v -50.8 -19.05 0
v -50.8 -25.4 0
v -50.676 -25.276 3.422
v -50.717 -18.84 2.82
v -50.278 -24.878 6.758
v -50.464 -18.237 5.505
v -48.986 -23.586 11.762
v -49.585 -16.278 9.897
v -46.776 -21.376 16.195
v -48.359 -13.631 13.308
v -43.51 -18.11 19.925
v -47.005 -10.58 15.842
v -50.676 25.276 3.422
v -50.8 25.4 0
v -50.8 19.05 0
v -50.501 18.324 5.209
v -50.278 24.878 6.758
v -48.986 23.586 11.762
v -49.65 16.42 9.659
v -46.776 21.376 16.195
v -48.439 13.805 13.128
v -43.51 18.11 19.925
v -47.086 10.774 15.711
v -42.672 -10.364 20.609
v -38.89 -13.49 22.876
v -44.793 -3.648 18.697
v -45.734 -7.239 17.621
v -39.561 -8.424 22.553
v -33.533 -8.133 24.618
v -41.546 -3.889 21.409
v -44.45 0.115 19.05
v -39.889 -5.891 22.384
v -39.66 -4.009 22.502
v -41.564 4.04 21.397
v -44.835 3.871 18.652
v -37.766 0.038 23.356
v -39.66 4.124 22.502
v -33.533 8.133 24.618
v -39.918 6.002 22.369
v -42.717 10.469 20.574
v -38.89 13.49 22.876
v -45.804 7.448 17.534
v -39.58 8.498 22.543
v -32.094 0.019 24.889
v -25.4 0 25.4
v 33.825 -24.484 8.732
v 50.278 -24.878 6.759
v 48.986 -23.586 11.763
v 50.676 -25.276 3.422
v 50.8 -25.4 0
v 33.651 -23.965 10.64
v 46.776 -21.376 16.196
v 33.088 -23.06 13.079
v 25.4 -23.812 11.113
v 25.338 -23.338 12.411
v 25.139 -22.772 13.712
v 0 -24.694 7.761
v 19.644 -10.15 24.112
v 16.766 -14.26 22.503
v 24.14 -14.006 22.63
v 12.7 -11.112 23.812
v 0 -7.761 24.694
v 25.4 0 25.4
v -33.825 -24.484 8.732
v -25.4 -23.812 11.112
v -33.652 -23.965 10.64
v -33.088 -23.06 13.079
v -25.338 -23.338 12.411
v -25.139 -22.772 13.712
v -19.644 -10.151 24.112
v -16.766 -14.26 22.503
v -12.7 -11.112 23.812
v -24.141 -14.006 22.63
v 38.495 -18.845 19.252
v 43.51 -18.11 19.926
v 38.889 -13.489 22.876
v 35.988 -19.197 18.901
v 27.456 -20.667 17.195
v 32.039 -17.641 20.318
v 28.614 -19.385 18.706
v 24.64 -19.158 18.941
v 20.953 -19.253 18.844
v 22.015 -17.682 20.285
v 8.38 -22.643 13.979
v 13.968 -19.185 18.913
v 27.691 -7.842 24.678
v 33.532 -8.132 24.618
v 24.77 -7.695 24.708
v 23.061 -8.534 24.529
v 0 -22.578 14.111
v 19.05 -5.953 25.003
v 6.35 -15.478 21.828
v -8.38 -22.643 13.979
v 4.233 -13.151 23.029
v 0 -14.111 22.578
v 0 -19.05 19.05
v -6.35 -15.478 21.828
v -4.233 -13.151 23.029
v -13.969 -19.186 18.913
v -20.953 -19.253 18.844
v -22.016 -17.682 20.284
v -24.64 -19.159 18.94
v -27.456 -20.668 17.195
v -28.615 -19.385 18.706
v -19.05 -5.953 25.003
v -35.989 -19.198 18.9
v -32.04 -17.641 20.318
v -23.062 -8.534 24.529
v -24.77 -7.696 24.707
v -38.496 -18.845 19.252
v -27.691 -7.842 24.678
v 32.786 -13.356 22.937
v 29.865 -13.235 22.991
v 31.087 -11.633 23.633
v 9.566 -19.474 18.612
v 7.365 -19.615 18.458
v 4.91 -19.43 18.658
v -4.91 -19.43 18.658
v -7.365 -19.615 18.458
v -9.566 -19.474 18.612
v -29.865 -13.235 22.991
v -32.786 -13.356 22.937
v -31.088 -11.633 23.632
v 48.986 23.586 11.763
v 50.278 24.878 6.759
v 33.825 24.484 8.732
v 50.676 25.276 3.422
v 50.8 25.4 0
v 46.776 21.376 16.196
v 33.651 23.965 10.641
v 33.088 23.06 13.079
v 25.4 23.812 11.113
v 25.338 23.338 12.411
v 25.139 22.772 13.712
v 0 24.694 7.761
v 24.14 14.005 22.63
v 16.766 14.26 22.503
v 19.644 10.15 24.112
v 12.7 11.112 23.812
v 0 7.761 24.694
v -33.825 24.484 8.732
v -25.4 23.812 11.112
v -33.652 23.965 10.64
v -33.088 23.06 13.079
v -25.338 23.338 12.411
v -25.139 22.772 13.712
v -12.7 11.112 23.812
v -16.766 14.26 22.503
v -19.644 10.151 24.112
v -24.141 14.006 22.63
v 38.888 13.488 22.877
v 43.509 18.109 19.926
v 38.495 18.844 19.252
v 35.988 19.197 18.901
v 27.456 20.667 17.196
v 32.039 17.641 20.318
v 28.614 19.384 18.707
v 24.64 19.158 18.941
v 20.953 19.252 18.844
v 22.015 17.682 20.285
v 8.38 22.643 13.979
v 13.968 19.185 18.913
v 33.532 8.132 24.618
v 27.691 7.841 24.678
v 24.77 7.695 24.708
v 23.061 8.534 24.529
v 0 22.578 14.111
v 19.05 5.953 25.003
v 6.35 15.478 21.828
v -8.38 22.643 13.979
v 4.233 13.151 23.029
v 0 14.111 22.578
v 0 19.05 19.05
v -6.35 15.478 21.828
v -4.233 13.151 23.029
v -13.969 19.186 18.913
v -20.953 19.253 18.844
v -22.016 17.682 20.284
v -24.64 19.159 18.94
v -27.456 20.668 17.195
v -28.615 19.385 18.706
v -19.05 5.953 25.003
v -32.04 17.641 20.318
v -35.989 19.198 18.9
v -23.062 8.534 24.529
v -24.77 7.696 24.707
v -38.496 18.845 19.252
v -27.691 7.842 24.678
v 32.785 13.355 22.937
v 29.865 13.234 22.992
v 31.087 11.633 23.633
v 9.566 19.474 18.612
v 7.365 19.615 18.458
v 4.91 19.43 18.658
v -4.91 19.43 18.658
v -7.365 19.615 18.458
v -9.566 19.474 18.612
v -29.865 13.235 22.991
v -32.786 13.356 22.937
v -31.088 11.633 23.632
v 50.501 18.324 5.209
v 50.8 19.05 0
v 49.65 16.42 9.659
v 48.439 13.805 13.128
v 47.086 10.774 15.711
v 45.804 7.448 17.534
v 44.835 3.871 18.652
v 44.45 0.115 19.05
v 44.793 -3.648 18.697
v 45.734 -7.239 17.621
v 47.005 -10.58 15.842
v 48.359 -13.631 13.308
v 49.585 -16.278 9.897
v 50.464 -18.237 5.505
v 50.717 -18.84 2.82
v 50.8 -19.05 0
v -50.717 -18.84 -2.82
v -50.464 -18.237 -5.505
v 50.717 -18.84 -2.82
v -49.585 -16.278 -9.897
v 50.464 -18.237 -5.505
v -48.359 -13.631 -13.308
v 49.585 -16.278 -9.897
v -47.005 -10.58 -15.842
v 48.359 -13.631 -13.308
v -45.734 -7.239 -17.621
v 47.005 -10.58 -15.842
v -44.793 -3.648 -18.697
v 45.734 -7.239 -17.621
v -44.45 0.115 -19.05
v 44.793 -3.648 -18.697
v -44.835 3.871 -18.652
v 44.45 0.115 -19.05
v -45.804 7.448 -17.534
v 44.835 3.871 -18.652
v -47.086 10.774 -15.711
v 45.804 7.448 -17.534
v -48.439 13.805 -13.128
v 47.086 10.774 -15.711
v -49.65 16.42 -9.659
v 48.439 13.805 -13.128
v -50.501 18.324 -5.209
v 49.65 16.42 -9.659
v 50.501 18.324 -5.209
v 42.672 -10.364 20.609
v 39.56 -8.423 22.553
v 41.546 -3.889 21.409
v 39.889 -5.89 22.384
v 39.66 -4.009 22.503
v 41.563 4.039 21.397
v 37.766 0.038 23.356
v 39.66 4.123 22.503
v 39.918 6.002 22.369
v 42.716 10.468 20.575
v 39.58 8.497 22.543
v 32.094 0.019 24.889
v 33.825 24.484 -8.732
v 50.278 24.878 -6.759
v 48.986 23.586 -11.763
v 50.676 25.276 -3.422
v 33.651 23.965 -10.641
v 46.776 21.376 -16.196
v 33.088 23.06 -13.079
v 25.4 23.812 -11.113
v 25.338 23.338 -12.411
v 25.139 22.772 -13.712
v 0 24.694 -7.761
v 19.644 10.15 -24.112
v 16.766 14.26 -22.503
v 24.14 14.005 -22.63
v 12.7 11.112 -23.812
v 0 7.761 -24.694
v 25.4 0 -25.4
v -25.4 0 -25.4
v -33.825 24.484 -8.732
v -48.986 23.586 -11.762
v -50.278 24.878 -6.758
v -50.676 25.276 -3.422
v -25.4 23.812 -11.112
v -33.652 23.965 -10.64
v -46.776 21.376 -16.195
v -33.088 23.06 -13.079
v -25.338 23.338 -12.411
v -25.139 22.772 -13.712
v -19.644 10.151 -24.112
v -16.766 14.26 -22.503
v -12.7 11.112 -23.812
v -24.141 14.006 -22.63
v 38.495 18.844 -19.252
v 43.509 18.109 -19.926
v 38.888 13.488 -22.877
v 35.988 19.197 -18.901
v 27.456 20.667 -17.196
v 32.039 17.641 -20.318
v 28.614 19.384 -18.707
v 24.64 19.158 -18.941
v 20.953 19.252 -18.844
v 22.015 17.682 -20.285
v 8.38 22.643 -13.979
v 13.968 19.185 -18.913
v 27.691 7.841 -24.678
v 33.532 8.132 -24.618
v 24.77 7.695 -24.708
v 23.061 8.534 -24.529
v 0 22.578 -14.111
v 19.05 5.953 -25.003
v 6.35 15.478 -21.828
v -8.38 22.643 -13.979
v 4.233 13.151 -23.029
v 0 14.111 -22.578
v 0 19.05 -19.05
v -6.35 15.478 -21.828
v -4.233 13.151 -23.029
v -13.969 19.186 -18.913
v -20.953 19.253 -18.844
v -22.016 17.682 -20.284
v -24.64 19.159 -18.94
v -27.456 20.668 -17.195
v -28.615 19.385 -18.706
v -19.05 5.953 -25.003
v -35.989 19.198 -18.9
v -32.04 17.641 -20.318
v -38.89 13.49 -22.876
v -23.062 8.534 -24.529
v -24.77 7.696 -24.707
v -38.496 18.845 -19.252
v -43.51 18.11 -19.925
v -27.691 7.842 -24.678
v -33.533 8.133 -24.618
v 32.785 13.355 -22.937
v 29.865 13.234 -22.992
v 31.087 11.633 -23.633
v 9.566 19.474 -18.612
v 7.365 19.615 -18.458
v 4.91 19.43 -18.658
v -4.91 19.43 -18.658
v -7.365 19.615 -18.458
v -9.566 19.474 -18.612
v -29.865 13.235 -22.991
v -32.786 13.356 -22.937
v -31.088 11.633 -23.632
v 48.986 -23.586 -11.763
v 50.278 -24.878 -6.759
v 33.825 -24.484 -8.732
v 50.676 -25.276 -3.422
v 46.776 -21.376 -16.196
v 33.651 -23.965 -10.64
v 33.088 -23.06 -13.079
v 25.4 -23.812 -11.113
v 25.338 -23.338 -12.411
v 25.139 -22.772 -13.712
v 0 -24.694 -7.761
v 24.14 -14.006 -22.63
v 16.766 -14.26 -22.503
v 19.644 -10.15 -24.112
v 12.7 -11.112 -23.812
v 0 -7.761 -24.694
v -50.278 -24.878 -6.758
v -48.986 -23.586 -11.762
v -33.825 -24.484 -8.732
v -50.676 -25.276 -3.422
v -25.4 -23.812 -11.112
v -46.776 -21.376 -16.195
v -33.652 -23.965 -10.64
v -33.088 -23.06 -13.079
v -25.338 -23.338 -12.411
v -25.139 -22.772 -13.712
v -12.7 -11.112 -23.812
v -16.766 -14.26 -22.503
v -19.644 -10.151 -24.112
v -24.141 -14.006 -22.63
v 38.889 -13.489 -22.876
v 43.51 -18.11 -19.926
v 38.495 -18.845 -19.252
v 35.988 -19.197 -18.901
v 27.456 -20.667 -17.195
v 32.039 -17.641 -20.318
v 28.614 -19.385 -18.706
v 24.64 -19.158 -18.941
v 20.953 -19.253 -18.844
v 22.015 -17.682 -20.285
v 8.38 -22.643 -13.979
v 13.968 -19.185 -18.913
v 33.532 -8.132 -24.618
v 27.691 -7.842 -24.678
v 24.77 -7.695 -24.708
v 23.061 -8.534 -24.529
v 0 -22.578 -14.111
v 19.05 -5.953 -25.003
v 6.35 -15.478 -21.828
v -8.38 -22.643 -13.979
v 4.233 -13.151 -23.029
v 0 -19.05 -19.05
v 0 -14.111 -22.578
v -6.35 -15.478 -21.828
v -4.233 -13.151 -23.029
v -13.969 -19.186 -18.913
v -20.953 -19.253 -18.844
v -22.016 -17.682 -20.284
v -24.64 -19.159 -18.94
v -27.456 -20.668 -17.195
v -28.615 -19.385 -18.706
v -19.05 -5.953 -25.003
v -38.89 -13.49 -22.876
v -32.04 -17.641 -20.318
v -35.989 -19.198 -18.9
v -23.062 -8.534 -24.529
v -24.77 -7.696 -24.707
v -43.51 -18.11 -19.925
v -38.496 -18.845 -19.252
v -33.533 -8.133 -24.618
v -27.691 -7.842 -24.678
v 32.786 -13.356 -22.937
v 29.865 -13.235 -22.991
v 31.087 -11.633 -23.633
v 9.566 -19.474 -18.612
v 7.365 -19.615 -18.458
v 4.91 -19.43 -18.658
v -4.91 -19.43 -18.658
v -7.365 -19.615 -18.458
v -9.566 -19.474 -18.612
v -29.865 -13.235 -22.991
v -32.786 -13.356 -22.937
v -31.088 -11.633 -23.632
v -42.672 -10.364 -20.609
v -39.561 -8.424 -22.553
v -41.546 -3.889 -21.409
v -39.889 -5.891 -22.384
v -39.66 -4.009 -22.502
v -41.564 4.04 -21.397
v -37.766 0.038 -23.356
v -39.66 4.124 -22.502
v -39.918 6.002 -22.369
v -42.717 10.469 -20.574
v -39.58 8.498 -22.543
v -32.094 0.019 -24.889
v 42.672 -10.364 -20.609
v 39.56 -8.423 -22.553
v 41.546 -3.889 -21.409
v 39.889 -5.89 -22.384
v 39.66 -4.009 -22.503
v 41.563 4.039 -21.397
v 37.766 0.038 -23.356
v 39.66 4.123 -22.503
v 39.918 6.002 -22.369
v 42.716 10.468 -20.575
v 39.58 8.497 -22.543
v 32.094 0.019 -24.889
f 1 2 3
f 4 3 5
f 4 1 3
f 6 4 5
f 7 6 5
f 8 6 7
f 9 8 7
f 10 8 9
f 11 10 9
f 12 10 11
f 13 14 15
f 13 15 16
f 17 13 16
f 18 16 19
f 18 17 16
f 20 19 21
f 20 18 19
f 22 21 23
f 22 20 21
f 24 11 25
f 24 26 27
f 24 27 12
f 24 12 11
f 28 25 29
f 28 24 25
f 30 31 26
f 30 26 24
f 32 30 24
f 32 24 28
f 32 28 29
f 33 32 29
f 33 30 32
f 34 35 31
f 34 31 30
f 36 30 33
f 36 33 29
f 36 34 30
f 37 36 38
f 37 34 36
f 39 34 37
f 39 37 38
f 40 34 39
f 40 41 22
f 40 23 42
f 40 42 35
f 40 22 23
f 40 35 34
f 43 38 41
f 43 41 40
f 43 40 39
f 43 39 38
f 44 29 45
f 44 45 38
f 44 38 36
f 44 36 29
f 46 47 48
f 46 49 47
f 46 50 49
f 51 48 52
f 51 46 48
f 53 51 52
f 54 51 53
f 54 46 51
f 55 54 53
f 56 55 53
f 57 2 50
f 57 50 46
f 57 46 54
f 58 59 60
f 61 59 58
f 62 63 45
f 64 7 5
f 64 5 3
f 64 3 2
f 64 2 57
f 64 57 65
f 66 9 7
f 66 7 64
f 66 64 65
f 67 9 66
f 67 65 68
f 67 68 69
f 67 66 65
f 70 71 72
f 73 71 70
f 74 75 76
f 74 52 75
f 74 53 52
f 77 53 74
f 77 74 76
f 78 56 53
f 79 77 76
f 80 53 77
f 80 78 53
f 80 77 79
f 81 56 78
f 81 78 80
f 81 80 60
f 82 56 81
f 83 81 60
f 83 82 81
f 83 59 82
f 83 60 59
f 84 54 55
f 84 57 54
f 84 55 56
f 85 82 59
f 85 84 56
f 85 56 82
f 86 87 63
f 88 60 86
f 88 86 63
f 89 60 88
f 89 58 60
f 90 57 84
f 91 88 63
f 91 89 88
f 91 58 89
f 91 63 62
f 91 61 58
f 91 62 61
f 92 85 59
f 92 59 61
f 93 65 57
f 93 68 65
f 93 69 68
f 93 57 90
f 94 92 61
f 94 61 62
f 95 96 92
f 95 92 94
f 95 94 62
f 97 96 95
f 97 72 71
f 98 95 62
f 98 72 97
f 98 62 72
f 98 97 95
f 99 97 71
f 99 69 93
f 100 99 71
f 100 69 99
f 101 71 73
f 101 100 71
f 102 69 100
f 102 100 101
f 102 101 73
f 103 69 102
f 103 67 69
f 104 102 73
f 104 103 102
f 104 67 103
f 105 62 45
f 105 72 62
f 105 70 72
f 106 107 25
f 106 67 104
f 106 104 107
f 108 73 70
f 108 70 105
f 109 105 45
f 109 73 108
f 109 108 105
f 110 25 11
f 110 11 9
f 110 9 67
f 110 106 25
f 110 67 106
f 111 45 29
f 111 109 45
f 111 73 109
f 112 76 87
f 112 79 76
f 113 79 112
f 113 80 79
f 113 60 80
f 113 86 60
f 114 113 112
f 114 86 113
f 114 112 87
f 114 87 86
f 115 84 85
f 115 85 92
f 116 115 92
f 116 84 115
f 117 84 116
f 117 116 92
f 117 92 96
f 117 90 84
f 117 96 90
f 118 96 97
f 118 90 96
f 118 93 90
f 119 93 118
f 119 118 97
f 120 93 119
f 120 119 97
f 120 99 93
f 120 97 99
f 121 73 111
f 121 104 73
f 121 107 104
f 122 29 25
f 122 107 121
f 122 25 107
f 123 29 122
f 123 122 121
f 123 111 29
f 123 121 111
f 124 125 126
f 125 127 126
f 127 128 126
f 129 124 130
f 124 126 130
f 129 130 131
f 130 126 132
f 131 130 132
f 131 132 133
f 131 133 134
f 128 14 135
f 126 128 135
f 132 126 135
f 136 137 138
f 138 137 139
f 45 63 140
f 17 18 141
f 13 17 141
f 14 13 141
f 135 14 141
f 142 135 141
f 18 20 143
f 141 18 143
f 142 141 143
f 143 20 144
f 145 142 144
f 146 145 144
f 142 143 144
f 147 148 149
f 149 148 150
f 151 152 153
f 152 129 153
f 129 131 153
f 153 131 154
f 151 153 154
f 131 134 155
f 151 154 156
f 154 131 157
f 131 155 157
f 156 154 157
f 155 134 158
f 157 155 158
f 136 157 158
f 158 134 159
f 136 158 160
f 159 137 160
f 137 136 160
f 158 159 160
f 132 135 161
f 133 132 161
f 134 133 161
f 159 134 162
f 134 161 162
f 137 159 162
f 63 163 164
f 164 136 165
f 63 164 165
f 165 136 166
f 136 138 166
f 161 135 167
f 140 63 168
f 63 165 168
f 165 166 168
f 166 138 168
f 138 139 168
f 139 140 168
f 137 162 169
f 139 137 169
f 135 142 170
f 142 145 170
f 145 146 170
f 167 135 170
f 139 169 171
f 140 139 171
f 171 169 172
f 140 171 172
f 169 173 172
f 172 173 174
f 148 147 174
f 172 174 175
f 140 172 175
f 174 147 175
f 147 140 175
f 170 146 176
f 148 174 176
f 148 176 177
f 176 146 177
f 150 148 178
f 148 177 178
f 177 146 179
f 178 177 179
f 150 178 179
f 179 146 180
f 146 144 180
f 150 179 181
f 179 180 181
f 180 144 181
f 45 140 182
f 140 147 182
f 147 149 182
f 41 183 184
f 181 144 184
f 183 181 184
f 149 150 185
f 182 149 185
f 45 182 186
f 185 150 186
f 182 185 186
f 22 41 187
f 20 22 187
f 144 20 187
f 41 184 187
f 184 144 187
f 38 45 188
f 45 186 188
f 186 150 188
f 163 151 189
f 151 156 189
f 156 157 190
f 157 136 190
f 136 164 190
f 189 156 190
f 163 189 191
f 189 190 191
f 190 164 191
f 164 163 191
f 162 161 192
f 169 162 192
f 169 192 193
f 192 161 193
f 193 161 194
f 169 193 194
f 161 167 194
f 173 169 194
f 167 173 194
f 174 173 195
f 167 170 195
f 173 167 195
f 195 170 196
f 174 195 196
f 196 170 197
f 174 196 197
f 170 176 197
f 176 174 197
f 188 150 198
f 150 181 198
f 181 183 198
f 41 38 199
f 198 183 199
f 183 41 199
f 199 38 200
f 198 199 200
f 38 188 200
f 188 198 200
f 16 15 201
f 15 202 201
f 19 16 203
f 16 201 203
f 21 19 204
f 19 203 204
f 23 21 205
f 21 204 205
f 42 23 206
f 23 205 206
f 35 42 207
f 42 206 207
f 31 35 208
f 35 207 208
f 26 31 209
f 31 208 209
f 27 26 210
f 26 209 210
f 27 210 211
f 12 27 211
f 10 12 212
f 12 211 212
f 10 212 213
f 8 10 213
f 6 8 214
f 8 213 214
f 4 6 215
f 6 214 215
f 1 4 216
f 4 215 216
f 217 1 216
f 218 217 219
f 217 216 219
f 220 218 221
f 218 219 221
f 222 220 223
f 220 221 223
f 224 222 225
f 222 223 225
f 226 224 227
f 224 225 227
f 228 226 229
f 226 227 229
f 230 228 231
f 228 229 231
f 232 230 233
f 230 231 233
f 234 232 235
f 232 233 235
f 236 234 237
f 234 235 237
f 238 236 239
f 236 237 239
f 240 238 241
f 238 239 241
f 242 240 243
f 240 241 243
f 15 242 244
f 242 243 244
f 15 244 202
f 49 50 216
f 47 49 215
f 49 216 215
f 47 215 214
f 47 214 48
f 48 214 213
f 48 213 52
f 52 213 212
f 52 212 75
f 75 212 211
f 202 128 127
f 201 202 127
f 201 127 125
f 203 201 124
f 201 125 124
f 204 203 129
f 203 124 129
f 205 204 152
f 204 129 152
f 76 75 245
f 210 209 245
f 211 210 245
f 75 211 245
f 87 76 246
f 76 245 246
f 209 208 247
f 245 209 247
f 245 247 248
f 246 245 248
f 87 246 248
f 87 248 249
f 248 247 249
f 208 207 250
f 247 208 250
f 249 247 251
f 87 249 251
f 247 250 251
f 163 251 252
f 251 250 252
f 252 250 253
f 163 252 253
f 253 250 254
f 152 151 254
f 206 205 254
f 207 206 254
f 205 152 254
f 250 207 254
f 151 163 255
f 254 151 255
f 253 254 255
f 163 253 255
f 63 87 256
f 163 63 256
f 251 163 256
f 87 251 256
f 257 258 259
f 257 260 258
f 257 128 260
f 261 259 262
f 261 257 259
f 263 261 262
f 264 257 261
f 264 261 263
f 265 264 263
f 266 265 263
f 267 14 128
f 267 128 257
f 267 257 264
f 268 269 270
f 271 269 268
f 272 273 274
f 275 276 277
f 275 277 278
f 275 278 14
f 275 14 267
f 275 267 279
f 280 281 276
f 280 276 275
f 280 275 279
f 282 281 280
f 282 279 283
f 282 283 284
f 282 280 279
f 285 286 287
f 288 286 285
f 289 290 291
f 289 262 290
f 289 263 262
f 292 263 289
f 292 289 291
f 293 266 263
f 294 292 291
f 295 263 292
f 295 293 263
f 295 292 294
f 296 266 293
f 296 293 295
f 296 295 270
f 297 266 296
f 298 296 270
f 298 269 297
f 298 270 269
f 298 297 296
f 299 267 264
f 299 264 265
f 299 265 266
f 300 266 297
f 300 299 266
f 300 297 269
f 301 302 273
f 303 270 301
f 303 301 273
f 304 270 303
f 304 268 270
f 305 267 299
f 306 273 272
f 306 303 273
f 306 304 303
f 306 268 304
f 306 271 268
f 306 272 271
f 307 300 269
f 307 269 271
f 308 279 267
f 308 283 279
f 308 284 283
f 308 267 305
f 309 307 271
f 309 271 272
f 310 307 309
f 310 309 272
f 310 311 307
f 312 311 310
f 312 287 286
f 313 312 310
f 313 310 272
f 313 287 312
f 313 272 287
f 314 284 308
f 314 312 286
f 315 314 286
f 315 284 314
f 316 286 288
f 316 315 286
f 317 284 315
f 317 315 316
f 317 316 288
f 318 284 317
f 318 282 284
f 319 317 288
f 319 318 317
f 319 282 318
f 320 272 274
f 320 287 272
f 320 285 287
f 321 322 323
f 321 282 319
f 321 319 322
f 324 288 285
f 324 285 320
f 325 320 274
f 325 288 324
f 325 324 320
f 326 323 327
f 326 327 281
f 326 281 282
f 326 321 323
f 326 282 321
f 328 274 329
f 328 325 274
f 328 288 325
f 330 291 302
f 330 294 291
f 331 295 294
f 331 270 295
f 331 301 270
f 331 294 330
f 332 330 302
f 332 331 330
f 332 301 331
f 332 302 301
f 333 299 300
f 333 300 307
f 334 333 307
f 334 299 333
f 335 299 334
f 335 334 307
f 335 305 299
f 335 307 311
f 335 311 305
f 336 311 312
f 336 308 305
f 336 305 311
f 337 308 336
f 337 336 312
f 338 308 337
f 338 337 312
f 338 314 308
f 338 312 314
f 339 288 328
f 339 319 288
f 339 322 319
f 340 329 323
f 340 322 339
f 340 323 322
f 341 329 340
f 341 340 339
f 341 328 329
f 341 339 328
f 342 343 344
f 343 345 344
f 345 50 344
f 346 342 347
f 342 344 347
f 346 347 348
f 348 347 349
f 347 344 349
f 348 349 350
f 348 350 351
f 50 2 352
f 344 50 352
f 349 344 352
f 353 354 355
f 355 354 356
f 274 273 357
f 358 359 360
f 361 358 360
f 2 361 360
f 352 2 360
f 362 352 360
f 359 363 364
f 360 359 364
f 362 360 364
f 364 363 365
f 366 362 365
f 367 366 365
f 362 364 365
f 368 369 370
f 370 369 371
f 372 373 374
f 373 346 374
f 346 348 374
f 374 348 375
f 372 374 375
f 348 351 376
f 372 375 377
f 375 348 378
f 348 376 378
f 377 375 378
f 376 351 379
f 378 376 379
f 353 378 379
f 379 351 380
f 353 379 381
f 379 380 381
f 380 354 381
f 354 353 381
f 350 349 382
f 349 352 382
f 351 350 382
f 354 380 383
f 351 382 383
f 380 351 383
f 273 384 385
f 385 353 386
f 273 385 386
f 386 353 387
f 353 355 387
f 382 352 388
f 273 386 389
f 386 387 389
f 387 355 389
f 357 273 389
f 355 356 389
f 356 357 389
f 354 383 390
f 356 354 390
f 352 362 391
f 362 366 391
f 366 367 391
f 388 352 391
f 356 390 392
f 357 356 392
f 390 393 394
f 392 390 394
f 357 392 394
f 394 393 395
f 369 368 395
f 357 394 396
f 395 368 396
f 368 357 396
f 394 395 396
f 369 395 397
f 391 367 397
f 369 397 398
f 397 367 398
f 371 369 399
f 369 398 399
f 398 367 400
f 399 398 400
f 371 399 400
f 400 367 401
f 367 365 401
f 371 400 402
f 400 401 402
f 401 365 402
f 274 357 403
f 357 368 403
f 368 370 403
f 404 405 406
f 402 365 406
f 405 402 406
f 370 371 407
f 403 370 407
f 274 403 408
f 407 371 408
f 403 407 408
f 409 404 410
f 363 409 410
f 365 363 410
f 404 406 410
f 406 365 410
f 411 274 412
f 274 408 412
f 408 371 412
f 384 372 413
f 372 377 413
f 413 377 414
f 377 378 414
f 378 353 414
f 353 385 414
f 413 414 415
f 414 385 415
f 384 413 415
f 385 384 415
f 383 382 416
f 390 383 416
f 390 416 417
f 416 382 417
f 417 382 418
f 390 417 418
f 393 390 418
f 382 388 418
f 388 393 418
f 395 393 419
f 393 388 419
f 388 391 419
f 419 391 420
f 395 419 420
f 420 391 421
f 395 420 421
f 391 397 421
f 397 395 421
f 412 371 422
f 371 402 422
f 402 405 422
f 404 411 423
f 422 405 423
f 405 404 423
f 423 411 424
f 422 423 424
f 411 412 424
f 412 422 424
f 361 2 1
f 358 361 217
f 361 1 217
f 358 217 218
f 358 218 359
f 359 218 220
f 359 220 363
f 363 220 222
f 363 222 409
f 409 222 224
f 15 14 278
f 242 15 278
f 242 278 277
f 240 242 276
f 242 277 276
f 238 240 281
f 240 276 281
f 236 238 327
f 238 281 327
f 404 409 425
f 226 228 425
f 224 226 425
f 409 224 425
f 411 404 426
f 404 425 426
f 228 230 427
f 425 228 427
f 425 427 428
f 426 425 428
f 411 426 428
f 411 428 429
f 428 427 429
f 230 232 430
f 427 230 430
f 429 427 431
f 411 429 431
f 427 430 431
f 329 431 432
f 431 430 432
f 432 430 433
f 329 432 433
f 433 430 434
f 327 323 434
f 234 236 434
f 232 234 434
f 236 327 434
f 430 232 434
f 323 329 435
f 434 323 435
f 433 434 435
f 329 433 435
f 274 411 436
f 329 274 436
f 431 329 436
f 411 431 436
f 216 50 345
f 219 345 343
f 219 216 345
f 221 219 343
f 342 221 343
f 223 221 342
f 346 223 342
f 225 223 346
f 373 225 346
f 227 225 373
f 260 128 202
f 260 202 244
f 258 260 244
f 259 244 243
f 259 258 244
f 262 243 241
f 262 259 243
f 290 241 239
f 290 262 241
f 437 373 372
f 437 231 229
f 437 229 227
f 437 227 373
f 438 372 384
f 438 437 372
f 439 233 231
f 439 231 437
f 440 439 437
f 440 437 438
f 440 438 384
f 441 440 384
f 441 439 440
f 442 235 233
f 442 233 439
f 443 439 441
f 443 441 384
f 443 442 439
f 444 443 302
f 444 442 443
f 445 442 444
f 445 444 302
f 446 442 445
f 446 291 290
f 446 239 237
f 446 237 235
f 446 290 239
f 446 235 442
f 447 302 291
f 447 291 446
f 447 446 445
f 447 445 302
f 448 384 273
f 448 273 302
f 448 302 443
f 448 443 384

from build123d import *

# Parameters (mm, degrees)
F0_W          = 101.6
F0_H          = 50.8
F1_DEPTH      = 25.4
F2_T1_DEPTH   = 177.8
F2_T3_DEPTH   = 228.6
F4_R          = 19.05
F5_DEPTH      = 50.8
F5_DEPTH_BACK = 50.8


# Not quite as in the source:
# - a fillet or chamfer that OpenCascade refuses, or shapes differently, is made with other operations: its cross-section is extruded or revolved along the edge and cut away or added
# - the program builds the solid bodies; features that only make, move or delete a surface that nothing else refers to are left out


with BuildPart() as f1:
    # F0 (on Top) → F1 (new body)
    with BuildSketch(Plane.XY):
        Rectangle(F0_W, F0_H)
    extrude(amount=F1_DEPTH)

    # F2: fillet of radius 25.4 on 4 edges, made by hand

    # F2_s2 → F2_t1 (cut)
    with BuildSketch(Plane.XZ.offset(-88.9)):
        with BuildLine():
            add(Edge.make_bspline(
                [(50.8, 0), (50.8, 25.4), (25.4, 25.4)],
                knots=[0, 0, 0, 1, 1, 1], degree=2, weights=[1, 1, 1]))
            Line((25.4, 25.4), (50.8, 25.4))
            Line((50.8, 25.4), (50.8, 0))
        make_face()
        with BuildLine():
            add(Edge.make_bspline(
                [(-50.8, 0), (-50.8, 25.4), (-25.4, 25.4)],
                knots=[0, 0, 0, 1, 1, 1], degree=2, weights=[1, 1, 1]))
            Line((-25.4, 25.4), (-50.8, 25.4))
            Line((-50.8, 25.4), (-50.8, 0))
        make_face()
    extrude(amount=F2_T1_DEPTH, mode=Mode.SUBTRACT)

    # F2_s4 → F2_t3 (cut)
    with BuildSketch(Plane.YZ.offset(-114.3)):
        with BuildLine():
            add(Edge.make_bspline(
                [(25.4, 0), (25.4, 25.4), (0, 25.4)],
                knots=[0, 0, 0, 1, 1, 1], degree=2, weights=[1, 1, 1]))
            Line((0, 25.4), (25.4, 25.4))
            Line((25.4, 25.4), (25.4, 0))
        make_face()
        with BuildLine():
            add(Edge.make_bspline(
                [(-25.4, 0), (-25.4, 25.4), (0, 25.4)],
                knots=[0, 0, 0, 1, 1, 1], degree=2, weights=[1, 1, 1]))
            Line((0, 25.4), (-25.4, 25.4))
            Line((-25.4, 25.4), (-25.4, 0))
        make_face()
    extrude(amount=F2_T3_DEPTH, mode=Mode.SUBTRACT)

    # F3: F1 across plane


with BuildPart() as f1_1:
    add(f1.part)
    add(f1.part.mirror(Plane.XY))

    # F4 (on Right) → F5 (cut, two sides)
    with BuildSketch(Plane.YZ) as f5_sk:
        Circle(F4_R)
    extrude(amount=-F5_DEPTH, mode=Mode.SUBTRACT)
    extrude(f5_sk.sketch, amount=F5_DEPTH_BACK, mode=Mode.SUBTRACT)


solid = f1_1.part
